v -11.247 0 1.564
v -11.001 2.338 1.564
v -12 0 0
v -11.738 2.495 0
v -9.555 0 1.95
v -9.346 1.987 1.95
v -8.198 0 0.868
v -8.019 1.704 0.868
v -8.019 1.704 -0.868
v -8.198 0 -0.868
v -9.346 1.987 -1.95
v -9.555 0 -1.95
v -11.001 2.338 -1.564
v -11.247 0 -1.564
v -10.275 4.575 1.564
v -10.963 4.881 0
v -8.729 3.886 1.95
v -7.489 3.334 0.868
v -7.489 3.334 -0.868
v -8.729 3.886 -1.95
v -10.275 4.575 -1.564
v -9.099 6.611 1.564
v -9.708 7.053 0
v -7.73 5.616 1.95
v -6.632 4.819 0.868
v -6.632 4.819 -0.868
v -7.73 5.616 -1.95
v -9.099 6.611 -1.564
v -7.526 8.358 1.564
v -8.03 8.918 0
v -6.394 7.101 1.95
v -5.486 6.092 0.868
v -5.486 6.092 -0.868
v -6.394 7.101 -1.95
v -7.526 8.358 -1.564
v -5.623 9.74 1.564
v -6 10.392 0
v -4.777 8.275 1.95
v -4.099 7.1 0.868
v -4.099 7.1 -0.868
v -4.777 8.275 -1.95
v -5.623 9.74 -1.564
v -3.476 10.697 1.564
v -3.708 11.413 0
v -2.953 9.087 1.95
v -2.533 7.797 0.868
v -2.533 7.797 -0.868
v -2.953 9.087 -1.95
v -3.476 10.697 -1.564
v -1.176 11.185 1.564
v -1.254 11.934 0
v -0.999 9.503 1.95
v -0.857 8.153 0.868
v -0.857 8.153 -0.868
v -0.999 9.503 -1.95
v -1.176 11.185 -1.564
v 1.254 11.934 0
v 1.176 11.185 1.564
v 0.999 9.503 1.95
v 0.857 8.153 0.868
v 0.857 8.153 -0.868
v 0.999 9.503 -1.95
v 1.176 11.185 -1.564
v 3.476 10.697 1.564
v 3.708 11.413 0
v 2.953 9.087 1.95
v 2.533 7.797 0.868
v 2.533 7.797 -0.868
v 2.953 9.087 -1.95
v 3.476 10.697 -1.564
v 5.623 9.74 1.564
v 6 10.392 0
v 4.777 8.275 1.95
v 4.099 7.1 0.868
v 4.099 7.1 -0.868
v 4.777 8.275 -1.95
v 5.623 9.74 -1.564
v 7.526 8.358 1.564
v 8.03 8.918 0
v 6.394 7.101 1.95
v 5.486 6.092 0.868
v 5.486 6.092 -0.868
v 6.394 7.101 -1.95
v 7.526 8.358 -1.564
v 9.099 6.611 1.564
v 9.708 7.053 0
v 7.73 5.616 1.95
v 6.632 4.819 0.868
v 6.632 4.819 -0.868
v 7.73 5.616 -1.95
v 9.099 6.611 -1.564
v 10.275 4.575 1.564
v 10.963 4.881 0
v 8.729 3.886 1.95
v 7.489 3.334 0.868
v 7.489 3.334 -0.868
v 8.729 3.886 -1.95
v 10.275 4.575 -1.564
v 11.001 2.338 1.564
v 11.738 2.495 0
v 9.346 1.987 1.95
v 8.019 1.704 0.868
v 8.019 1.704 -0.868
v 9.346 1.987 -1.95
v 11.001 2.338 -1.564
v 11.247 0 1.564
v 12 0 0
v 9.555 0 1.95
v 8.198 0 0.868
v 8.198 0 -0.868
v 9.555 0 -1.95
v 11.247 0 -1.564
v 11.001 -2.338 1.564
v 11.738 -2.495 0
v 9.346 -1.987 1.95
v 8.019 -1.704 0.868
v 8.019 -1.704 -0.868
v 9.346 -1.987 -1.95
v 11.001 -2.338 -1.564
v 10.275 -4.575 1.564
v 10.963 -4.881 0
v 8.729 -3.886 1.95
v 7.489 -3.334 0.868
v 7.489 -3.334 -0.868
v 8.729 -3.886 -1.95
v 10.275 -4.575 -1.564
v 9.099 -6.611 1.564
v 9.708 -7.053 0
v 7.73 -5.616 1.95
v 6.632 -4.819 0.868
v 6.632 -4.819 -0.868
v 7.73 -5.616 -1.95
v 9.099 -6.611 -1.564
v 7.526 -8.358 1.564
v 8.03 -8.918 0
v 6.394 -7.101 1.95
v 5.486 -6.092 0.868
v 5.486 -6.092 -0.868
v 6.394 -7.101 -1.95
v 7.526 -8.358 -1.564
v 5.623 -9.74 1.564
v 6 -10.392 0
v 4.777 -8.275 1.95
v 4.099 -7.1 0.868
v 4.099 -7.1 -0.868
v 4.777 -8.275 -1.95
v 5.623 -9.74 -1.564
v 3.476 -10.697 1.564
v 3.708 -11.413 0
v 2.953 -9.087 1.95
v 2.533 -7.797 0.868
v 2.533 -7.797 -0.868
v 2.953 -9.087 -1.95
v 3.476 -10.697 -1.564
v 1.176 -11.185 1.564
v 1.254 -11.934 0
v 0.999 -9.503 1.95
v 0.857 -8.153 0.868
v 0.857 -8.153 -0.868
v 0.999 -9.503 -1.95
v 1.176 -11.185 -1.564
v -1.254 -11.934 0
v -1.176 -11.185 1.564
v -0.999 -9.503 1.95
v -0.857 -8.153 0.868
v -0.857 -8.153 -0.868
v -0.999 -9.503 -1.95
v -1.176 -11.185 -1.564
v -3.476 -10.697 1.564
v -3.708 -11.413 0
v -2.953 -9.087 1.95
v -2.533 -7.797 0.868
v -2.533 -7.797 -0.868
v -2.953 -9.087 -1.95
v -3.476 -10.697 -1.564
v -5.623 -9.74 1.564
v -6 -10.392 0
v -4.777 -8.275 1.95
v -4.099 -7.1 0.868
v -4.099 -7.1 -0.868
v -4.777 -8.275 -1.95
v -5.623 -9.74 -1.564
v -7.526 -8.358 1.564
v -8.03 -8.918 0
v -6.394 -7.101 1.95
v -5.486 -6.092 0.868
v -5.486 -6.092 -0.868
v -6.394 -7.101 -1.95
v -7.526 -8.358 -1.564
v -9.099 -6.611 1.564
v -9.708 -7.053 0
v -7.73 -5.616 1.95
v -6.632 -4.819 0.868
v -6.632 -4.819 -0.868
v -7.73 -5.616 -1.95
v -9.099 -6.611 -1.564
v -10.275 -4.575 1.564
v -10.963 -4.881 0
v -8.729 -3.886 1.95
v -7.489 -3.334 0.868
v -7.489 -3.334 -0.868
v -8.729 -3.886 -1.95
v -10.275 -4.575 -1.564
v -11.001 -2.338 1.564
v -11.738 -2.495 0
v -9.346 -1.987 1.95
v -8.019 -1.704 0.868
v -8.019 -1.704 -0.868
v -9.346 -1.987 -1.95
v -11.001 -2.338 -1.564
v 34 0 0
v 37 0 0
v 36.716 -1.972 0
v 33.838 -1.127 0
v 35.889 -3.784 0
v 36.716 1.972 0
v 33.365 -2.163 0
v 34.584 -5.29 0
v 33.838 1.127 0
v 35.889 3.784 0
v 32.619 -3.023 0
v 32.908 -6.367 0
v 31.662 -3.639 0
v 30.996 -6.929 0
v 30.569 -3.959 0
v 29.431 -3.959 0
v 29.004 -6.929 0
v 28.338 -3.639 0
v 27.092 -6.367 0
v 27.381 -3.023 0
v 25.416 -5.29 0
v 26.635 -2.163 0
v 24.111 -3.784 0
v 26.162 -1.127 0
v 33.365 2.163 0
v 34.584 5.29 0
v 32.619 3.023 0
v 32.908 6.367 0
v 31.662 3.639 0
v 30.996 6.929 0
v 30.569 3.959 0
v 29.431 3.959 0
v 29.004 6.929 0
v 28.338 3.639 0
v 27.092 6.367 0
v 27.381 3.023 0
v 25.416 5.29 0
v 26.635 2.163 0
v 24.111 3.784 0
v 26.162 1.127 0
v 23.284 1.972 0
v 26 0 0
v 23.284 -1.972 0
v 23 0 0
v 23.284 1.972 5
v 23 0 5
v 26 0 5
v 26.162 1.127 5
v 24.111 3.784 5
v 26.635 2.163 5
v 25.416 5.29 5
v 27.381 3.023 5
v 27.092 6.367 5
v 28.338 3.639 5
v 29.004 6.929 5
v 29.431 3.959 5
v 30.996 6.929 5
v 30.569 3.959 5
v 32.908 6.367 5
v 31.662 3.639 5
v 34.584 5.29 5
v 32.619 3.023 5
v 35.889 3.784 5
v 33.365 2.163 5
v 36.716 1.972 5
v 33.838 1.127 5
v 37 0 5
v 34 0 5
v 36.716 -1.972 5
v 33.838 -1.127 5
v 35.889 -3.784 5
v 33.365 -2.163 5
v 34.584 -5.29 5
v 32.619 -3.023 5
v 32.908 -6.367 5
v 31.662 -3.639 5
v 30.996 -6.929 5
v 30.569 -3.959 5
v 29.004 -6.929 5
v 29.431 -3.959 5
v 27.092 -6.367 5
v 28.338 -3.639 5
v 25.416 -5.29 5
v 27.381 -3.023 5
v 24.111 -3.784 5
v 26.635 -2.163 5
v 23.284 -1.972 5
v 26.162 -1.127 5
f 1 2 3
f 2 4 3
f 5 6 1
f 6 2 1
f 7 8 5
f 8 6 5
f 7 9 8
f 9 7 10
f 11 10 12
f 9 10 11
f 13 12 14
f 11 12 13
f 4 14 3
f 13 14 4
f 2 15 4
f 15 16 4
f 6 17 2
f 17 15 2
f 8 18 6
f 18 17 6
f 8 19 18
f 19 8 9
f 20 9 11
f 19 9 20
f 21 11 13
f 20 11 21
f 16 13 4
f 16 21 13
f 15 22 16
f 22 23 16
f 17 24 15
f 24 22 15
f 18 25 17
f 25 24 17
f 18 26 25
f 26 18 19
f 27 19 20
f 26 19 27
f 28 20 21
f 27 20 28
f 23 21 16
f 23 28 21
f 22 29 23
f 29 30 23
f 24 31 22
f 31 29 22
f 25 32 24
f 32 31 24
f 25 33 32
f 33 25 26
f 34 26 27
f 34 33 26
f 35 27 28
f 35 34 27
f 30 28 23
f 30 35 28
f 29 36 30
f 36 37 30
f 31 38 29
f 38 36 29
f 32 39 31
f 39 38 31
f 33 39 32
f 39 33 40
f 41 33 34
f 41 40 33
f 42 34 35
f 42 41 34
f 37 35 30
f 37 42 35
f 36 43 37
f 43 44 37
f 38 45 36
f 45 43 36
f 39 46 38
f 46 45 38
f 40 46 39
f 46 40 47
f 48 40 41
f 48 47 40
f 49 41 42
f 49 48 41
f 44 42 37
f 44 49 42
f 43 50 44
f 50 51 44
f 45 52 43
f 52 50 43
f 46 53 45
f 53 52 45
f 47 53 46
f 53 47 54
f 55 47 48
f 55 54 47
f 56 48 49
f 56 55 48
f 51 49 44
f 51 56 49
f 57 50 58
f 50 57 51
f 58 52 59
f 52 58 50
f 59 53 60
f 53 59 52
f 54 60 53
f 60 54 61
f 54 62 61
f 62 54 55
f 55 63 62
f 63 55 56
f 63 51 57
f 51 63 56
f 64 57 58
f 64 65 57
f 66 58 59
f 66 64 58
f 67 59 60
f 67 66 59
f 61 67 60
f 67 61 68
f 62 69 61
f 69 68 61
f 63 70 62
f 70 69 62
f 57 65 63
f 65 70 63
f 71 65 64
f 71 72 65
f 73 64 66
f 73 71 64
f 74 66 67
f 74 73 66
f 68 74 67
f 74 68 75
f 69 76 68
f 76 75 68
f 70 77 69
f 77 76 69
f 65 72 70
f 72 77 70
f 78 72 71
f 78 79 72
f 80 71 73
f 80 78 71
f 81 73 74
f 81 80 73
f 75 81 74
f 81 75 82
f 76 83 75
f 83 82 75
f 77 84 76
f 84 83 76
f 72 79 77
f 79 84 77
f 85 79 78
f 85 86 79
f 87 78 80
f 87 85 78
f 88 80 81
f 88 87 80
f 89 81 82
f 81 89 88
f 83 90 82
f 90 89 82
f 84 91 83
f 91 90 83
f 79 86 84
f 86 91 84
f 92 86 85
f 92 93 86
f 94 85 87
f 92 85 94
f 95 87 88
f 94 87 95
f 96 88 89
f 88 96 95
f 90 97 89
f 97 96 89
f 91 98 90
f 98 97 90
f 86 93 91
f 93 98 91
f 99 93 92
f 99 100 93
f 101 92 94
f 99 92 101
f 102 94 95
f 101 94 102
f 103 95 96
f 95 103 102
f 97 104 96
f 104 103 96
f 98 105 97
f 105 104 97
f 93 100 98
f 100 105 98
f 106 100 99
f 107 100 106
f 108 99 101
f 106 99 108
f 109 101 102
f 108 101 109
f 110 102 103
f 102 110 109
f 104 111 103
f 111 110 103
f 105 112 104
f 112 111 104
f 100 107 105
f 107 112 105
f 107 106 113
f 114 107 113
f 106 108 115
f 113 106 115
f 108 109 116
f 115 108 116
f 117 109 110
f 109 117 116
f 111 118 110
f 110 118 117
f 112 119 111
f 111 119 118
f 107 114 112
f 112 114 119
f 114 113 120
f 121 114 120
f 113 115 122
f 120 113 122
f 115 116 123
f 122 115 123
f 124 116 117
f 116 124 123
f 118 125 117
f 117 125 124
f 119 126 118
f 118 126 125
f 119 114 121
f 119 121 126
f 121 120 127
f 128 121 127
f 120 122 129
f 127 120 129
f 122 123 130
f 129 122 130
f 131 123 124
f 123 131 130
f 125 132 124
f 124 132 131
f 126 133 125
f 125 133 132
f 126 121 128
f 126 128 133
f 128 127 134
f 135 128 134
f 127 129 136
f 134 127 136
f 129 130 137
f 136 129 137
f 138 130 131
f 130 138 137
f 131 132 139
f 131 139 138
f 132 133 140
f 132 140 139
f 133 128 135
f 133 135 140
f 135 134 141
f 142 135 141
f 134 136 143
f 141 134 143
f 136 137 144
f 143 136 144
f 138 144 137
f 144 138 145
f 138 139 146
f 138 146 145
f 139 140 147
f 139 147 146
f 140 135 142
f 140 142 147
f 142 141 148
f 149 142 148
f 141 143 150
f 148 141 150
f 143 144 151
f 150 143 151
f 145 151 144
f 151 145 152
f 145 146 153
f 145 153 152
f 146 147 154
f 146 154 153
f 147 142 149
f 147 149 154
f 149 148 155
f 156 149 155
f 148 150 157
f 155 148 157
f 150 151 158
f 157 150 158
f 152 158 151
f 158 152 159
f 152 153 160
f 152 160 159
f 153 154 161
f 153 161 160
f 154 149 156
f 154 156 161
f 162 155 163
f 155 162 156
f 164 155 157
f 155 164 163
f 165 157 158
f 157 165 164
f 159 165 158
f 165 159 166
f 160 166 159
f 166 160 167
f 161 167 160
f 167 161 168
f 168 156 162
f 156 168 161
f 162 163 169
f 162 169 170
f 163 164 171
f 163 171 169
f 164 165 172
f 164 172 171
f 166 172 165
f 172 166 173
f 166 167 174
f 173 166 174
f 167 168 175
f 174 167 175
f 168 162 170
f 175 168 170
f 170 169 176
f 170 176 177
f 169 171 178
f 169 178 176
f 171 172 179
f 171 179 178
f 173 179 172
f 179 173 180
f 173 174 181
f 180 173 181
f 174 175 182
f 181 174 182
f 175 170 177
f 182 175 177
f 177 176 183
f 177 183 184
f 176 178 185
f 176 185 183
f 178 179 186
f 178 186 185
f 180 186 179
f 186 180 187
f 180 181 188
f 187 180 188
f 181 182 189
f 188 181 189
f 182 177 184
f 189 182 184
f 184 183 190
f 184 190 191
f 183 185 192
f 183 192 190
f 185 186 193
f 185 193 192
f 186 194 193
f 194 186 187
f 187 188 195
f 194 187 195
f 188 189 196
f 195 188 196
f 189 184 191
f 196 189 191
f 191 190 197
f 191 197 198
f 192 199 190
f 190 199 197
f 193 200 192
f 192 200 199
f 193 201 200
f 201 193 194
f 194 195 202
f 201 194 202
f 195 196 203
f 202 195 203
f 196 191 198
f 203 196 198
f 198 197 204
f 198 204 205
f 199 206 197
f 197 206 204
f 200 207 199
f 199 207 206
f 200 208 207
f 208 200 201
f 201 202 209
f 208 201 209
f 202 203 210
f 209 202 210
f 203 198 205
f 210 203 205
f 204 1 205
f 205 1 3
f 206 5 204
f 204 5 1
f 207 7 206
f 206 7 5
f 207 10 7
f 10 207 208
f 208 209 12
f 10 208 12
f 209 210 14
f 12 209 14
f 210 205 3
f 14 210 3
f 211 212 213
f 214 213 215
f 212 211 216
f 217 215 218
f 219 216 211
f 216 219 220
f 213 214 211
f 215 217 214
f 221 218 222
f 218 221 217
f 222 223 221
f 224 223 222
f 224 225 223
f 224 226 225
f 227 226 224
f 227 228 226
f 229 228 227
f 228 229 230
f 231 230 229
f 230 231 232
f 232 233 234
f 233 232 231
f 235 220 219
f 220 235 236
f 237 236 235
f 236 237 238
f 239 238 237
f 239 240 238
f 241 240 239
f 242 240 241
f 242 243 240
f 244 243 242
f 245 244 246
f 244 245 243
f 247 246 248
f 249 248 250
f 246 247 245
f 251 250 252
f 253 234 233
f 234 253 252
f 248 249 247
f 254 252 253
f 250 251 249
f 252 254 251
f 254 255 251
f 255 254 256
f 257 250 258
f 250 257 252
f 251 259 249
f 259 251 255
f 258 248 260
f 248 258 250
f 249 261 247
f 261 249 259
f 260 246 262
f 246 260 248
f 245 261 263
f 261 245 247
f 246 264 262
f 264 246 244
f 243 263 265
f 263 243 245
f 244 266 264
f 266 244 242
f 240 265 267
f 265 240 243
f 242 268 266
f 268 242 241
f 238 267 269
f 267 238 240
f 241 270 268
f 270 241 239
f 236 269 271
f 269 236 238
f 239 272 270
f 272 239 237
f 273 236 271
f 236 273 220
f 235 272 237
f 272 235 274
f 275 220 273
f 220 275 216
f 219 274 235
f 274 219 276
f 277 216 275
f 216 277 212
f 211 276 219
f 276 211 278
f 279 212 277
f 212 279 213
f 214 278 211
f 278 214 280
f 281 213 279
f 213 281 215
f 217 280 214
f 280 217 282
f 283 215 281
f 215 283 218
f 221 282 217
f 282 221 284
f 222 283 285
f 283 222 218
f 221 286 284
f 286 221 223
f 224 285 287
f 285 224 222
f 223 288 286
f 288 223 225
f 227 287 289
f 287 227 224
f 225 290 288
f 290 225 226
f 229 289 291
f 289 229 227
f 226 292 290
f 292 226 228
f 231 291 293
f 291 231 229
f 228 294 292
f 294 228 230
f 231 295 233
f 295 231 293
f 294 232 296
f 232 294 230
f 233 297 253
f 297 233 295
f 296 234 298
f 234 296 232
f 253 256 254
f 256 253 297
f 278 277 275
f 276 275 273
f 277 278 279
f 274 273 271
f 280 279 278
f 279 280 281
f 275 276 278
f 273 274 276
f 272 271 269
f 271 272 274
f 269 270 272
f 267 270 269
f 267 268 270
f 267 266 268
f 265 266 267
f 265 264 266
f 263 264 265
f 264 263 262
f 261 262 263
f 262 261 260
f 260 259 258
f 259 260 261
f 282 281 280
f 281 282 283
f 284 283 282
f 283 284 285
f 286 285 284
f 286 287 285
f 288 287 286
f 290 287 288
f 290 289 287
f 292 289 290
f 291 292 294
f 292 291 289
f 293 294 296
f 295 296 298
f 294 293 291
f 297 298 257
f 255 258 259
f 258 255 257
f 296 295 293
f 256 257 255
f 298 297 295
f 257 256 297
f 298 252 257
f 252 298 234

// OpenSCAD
// Zweck: rotate_extrude eines verschobenen Kreises (Ring) und eines Rechtecks (Scheibe mit Loch).
rotate_extrude() translate([10, 0]) circle(r = 2);
translate([30, 0, 0]) rotate_extrude() translate([4, 0]) square([3, 5]);
